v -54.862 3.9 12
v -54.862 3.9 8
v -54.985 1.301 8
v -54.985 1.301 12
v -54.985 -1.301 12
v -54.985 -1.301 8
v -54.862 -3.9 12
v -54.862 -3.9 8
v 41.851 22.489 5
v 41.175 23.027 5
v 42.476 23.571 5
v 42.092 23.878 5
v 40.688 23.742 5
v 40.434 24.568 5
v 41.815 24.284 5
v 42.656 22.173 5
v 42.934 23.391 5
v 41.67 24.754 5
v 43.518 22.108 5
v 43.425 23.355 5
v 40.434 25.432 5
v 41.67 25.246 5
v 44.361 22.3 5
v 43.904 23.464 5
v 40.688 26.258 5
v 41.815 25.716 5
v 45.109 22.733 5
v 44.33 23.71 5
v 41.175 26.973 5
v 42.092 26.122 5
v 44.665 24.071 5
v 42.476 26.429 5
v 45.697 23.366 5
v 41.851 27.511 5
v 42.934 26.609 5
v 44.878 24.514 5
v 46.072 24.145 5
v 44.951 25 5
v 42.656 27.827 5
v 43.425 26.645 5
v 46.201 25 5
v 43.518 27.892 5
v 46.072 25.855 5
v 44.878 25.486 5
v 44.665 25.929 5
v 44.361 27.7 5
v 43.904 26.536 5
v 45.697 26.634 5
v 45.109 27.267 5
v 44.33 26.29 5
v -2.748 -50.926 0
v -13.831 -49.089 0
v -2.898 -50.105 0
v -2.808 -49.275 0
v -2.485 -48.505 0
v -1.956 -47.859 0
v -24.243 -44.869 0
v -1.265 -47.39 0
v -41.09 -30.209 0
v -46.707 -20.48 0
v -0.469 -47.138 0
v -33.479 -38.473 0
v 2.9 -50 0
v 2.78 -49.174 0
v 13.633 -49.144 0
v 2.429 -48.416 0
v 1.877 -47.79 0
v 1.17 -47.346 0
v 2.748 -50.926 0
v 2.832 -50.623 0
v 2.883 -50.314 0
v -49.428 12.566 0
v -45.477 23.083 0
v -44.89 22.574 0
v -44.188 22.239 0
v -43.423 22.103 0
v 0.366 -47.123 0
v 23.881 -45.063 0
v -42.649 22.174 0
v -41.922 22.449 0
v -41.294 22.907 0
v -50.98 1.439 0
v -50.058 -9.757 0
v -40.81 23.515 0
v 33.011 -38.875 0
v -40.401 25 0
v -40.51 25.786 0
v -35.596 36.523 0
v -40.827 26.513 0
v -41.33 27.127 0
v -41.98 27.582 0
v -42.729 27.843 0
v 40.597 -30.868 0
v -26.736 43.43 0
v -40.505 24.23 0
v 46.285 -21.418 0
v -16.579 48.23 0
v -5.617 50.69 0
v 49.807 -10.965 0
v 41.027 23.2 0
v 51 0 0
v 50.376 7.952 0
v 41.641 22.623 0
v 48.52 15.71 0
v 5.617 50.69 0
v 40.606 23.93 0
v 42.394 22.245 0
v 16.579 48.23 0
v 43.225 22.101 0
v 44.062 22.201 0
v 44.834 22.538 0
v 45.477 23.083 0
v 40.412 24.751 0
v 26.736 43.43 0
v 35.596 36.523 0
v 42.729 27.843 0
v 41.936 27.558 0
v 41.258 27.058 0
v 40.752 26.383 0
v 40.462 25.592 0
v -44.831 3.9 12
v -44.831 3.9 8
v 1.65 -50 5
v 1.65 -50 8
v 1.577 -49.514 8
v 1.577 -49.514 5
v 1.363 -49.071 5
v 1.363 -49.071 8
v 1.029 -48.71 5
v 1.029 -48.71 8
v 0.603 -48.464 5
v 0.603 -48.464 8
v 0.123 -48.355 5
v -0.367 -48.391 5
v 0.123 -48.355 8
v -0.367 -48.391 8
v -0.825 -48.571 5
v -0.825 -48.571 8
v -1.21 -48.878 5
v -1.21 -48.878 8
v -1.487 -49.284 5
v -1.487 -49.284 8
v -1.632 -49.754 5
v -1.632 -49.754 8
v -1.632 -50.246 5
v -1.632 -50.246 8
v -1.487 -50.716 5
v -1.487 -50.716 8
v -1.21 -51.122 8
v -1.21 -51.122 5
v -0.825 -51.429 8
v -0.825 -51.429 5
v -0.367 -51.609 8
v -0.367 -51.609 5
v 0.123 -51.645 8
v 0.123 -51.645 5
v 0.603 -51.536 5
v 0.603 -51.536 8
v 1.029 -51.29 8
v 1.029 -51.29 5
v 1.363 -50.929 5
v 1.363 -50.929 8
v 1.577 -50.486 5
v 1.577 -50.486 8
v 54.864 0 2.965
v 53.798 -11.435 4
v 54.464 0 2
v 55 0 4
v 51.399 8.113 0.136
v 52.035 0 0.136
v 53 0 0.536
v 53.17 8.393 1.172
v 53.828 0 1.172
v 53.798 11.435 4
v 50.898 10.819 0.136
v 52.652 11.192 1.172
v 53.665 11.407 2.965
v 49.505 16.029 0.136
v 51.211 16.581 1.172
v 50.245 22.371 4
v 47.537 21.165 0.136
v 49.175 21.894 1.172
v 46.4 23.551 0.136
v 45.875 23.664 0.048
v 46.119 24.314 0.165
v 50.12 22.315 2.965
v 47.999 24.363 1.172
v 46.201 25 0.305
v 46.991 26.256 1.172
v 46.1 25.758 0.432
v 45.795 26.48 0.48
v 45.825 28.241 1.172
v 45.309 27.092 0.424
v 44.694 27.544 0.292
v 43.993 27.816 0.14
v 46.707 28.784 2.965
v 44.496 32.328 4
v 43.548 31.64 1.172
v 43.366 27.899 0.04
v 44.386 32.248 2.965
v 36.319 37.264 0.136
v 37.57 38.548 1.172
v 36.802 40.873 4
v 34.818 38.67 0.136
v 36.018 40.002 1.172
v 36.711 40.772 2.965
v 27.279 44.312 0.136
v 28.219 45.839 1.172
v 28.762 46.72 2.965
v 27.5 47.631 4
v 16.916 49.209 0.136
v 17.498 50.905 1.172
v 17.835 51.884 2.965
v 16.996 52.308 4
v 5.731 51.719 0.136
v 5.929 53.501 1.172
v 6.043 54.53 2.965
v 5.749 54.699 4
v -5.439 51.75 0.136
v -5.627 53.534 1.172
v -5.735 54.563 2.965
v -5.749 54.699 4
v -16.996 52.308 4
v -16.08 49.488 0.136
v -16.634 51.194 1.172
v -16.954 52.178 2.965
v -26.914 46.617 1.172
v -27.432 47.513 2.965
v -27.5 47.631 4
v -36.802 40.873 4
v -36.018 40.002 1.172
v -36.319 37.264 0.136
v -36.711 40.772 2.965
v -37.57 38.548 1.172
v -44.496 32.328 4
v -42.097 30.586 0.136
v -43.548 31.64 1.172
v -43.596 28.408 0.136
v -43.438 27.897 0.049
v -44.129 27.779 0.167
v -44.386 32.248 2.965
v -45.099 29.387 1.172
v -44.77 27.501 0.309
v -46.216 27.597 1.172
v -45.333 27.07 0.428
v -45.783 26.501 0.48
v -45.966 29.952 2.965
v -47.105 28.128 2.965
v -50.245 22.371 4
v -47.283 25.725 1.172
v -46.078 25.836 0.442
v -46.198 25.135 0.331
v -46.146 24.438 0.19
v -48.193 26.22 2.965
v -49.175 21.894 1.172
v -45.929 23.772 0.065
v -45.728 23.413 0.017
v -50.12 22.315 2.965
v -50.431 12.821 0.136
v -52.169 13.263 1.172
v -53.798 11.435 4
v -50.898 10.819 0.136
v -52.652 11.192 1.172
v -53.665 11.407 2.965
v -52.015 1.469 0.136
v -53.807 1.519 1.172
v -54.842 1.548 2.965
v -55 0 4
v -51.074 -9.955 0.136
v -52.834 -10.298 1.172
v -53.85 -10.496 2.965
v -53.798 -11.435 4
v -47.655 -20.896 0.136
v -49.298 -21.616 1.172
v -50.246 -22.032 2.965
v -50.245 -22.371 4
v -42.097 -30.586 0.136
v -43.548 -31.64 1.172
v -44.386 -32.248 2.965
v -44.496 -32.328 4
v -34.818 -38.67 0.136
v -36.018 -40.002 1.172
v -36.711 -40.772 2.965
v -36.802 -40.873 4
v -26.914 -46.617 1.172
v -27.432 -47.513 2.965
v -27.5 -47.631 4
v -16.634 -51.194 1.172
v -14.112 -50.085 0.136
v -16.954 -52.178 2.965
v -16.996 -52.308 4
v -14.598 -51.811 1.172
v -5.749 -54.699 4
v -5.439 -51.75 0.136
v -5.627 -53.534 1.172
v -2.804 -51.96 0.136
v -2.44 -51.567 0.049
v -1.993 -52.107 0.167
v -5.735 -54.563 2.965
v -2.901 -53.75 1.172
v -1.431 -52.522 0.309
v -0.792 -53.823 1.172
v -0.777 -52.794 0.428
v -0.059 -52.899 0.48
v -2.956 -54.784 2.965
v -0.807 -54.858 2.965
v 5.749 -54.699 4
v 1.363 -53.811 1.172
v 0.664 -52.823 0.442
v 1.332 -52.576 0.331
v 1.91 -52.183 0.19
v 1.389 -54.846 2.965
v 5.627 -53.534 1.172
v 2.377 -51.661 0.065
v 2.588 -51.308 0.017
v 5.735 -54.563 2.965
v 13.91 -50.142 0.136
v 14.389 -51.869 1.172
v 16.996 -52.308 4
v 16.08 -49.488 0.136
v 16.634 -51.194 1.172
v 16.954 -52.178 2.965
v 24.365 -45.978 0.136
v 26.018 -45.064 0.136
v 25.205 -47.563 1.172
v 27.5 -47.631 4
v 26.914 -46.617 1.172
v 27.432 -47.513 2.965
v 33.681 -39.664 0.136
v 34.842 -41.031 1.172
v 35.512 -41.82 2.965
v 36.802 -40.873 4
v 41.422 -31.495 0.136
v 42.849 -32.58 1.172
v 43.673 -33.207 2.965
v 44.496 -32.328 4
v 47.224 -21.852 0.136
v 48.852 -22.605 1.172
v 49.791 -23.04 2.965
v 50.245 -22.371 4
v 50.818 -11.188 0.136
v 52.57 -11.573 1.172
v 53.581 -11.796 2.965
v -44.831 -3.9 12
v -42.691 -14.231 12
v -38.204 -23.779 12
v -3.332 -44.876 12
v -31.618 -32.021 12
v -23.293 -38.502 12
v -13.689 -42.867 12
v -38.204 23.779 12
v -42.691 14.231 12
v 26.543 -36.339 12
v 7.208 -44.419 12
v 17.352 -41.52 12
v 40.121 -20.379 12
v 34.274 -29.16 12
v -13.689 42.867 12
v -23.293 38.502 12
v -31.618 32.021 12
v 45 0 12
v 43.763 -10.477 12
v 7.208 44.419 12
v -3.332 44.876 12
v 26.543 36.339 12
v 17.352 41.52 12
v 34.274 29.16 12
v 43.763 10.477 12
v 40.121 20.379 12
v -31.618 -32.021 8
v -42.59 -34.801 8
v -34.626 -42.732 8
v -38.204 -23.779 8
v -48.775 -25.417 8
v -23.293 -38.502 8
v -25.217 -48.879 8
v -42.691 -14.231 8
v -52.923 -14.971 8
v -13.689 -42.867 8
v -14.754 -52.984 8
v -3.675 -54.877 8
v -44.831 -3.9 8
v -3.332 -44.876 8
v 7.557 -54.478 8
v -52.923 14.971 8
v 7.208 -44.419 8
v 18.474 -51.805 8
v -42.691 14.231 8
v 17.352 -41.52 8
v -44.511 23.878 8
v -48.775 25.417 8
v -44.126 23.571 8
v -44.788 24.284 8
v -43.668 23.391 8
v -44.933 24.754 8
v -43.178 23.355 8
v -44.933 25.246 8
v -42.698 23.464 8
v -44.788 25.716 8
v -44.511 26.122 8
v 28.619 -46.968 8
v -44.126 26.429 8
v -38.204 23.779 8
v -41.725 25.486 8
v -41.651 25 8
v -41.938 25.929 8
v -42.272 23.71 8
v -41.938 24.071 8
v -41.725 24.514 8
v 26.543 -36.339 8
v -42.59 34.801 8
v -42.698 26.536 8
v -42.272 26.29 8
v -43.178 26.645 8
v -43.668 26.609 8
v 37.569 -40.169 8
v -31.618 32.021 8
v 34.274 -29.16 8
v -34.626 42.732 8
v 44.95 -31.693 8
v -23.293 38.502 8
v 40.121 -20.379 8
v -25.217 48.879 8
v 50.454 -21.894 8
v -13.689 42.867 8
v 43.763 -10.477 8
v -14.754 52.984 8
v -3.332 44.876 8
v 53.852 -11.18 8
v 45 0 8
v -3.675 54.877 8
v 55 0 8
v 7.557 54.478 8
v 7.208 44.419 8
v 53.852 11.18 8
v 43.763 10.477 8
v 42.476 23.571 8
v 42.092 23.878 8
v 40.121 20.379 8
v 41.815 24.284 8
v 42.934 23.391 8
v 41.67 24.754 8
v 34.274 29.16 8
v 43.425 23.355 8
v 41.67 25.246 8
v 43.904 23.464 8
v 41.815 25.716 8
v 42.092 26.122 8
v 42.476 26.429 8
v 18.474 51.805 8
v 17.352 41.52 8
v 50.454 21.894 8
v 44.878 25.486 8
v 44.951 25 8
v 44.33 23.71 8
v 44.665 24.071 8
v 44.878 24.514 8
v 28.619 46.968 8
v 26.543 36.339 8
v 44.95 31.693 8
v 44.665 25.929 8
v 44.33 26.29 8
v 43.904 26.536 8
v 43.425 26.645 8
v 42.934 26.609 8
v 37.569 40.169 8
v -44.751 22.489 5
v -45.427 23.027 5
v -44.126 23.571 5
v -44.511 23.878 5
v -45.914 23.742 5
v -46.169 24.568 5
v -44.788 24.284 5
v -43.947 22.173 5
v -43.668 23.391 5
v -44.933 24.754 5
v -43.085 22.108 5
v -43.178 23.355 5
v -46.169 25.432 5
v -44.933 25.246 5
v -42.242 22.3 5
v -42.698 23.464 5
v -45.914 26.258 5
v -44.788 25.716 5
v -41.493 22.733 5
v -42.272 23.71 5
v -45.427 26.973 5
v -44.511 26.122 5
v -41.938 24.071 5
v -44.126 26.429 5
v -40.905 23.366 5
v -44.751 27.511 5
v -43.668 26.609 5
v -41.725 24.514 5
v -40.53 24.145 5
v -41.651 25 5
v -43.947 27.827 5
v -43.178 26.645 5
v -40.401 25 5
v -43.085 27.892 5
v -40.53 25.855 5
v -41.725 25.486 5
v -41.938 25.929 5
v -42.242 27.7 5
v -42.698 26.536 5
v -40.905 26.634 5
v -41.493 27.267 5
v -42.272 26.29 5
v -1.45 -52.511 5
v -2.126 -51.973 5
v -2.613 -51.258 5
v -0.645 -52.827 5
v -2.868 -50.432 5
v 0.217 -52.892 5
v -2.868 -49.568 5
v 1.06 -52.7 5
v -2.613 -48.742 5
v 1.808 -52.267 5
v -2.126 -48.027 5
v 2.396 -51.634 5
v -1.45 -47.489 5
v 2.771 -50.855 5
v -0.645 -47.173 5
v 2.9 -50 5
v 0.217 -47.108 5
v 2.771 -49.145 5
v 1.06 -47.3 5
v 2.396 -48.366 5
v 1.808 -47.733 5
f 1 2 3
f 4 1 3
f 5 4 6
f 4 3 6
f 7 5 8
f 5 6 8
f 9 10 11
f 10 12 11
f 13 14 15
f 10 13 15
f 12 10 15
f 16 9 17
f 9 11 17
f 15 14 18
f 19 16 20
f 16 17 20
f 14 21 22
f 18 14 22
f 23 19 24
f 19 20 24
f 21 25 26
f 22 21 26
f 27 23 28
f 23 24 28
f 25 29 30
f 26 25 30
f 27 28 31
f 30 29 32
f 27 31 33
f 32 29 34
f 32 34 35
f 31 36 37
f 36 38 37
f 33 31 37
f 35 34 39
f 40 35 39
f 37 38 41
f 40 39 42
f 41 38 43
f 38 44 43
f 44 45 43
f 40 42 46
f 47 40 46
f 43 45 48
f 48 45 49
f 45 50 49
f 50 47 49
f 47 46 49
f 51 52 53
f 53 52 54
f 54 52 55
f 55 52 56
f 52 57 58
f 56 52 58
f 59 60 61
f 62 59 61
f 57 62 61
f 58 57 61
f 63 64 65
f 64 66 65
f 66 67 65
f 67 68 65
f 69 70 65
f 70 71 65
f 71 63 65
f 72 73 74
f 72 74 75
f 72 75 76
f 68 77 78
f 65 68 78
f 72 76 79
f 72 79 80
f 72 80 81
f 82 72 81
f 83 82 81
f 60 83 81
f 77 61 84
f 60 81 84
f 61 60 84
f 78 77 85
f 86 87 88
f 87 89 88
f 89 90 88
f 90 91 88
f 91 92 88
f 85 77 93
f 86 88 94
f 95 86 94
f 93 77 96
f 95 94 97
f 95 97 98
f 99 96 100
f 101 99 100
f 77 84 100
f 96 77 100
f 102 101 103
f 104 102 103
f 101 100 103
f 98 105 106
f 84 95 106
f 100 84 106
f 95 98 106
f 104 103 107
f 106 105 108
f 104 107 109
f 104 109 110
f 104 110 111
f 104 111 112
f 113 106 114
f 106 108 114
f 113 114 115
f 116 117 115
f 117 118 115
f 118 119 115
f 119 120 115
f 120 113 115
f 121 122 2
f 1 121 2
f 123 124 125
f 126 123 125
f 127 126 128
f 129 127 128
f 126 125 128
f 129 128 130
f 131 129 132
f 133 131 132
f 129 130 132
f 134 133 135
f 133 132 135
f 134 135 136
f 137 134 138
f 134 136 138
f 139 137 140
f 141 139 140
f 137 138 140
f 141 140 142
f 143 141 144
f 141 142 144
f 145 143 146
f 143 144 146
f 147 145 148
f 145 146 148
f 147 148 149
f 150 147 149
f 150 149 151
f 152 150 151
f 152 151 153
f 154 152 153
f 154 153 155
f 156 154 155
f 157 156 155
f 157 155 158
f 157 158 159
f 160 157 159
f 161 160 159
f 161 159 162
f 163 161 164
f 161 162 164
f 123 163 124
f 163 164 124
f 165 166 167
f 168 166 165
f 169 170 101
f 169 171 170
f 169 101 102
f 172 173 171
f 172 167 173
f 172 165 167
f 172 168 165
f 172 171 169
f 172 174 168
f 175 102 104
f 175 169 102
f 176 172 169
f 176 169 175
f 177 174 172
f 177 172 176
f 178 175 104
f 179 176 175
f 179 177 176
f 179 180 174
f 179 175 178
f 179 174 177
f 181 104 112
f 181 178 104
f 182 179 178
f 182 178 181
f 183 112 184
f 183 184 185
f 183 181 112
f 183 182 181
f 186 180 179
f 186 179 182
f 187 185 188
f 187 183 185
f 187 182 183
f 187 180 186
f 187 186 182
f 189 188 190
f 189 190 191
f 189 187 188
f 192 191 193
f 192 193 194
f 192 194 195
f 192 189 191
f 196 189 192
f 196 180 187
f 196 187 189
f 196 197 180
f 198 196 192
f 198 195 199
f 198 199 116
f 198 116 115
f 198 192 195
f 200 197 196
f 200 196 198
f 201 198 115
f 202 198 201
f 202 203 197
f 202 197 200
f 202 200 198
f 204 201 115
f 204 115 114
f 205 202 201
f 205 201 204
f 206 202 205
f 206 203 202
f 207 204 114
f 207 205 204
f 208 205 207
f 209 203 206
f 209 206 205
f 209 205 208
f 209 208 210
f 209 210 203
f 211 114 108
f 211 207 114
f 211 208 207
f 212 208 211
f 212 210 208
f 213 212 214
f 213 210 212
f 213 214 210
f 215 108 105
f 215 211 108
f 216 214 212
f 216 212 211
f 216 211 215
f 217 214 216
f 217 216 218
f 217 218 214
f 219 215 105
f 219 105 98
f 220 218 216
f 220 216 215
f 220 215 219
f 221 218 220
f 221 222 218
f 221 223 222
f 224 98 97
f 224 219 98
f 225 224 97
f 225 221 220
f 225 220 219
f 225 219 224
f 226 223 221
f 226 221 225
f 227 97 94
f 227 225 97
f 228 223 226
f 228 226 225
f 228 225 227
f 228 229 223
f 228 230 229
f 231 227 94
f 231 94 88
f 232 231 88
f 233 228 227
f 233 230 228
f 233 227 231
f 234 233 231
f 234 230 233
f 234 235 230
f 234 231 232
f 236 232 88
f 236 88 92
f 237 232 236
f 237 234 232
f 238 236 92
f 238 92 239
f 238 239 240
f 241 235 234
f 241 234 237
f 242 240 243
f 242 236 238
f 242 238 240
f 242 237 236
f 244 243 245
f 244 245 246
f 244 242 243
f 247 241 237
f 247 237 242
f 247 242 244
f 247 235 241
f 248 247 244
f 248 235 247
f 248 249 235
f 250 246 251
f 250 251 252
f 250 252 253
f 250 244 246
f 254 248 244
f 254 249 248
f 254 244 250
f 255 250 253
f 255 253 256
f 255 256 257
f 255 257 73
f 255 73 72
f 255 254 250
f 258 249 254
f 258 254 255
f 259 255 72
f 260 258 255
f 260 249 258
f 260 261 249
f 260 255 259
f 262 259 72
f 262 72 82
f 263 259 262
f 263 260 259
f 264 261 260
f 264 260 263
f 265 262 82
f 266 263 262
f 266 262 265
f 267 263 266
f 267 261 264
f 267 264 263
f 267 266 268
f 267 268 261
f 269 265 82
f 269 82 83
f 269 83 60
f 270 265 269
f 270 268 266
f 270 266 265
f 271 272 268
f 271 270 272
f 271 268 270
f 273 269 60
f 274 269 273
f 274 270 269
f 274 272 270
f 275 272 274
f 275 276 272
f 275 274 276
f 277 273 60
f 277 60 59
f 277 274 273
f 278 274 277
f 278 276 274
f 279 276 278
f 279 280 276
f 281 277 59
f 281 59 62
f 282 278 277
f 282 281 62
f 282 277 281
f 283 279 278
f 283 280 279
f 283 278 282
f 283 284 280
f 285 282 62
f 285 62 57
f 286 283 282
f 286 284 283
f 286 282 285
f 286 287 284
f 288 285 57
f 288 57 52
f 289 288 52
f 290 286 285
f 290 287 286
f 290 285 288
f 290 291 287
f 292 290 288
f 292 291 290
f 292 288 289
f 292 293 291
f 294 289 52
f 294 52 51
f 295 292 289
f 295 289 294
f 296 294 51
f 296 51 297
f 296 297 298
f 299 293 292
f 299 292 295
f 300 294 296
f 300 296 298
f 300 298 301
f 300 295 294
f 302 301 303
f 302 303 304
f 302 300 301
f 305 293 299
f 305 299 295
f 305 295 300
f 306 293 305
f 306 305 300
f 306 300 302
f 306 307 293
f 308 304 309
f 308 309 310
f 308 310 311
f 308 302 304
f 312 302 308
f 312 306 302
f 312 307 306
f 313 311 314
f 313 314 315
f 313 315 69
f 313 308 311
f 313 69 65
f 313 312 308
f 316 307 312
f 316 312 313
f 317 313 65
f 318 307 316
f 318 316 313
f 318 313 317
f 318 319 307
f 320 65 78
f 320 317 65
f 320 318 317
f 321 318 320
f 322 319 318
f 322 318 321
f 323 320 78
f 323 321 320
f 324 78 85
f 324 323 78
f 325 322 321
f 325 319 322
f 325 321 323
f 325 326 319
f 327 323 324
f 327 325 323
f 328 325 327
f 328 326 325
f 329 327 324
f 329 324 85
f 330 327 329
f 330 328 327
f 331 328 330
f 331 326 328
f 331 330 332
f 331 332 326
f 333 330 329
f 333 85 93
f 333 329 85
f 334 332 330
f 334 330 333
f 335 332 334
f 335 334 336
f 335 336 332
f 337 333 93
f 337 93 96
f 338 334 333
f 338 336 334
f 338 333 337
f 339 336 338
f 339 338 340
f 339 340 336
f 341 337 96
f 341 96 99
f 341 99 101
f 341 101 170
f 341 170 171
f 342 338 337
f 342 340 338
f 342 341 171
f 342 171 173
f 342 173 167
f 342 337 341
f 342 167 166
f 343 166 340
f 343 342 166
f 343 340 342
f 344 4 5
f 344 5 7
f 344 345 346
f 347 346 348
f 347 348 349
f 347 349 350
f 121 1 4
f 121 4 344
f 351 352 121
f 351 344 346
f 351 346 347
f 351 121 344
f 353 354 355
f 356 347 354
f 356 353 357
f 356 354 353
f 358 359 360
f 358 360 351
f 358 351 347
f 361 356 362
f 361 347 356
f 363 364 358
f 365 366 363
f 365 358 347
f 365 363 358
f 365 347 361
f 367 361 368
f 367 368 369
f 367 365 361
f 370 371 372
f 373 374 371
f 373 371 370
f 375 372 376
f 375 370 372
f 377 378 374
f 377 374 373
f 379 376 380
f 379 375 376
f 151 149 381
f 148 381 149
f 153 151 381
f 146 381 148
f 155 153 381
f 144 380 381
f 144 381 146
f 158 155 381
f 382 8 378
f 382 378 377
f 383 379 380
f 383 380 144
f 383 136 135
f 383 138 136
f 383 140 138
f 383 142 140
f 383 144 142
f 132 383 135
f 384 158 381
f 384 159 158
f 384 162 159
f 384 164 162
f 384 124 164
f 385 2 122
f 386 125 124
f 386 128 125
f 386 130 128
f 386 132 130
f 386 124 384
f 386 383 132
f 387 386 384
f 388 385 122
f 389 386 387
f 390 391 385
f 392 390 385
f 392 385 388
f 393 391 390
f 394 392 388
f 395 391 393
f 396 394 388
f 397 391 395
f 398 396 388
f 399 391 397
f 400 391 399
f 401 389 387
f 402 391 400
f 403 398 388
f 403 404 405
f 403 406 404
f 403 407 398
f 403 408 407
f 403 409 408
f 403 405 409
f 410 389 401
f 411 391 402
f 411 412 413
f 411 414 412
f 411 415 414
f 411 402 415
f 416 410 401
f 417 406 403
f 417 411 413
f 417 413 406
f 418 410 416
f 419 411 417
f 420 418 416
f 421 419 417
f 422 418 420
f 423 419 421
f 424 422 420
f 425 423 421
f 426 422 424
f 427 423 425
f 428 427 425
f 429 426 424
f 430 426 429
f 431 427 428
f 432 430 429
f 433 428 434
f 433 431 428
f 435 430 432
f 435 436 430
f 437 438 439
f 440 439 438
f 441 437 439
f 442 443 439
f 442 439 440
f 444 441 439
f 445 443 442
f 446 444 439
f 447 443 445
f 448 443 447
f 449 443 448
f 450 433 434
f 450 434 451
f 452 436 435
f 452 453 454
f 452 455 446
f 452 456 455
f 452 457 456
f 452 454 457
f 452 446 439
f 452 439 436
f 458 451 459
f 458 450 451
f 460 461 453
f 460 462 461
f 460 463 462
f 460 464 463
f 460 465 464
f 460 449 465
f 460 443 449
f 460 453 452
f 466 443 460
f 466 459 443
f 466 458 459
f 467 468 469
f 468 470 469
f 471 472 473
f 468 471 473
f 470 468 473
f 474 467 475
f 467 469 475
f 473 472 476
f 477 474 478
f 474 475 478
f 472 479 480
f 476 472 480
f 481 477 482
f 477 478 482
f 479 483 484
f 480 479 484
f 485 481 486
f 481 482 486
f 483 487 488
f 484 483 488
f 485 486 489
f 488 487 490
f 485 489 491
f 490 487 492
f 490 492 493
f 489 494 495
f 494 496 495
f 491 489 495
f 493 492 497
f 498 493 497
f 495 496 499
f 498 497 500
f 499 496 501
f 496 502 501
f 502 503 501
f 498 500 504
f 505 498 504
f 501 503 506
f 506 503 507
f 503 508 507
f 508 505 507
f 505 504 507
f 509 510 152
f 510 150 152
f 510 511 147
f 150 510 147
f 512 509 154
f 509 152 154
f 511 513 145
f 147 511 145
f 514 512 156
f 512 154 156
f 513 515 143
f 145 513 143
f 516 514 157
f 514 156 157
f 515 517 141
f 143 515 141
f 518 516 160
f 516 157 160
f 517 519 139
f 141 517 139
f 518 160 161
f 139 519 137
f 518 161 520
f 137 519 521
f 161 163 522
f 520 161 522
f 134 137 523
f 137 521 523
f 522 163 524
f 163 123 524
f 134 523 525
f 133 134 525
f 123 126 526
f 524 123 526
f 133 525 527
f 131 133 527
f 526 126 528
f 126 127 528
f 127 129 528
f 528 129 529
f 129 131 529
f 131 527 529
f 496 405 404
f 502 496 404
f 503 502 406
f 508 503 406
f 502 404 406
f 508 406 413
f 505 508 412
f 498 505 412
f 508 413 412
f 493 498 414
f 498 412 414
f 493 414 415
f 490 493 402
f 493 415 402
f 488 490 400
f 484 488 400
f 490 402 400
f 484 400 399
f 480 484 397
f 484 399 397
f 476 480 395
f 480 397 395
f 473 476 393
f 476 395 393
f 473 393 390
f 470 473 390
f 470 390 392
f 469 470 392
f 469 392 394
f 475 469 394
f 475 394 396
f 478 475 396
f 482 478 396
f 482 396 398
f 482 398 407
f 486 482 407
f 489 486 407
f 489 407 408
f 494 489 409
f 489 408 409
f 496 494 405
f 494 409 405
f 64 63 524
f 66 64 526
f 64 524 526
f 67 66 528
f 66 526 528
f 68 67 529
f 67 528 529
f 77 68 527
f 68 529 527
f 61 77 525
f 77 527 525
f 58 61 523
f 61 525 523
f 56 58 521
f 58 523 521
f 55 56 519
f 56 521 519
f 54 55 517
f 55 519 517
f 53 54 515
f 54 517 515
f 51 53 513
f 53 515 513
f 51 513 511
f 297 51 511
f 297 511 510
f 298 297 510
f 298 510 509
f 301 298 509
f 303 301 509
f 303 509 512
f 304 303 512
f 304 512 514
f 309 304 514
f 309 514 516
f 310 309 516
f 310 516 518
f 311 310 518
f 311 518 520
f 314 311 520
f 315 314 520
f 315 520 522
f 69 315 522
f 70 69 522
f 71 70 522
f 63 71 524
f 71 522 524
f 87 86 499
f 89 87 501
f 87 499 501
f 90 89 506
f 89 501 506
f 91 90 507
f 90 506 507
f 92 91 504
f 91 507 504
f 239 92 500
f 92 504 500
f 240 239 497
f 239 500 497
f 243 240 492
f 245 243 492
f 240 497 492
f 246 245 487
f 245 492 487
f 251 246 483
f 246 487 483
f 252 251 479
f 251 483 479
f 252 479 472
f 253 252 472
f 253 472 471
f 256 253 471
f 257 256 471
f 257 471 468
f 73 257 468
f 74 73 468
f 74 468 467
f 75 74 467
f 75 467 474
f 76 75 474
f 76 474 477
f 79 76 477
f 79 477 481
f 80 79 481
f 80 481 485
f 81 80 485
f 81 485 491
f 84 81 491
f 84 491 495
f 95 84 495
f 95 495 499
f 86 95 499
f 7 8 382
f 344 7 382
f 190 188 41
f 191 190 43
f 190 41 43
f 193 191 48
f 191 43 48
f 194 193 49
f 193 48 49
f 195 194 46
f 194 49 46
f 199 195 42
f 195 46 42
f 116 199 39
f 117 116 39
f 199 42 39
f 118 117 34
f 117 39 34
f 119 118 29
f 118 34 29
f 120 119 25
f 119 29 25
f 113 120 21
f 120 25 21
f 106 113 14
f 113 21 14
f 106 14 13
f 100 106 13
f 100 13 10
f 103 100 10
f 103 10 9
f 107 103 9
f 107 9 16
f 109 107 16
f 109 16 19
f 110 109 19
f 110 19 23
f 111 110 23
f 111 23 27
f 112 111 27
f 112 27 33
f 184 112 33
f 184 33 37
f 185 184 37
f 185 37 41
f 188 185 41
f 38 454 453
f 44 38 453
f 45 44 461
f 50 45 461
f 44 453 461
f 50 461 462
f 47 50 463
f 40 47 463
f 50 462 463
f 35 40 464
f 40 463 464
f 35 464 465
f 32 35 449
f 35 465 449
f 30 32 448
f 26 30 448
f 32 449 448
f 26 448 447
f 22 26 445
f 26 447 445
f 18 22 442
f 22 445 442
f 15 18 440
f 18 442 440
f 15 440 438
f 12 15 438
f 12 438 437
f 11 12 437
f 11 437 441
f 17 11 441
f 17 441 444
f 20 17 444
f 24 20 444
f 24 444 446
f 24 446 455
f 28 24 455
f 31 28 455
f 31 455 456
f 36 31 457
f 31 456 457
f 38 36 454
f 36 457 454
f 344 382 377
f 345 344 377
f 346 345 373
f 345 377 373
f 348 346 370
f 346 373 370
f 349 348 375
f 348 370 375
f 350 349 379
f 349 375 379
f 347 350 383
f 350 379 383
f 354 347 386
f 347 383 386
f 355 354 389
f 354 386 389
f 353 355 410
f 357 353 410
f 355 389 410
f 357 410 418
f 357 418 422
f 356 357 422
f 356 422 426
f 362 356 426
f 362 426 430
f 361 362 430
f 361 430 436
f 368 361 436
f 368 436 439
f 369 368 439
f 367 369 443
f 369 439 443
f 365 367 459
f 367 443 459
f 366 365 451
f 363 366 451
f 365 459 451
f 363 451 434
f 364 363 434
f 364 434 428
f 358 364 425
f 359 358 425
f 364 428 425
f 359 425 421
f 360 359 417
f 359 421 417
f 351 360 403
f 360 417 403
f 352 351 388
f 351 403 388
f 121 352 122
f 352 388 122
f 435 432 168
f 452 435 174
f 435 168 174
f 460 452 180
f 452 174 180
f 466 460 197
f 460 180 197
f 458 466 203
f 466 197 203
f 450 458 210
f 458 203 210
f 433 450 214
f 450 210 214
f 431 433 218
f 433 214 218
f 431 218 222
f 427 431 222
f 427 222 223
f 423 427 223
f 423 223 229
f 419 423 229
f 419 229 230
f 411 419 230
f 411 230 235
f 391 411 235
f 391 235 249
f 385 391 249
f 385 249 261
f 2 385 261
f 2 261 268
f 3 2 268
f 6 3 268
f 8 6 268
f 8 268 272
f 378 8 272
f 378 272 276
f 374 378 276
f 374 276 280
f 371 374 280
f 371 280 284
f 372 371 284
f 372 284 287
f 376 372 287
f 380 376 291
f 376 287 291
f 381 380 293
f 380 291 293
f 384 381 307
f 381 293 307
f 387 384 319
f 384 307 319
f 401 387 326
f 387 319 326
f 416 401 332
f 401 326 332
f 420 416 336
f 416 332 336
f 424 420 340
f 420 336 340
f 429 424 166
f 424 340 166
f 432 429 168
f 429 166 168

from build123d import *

# Parameters (mm, degrees)
ESBO_O1_R                = 55
RESSALTO_EXTRUS_O1_DEPTH = 8
RESSALTO_EXTRUS_O2_DEPTH = 4
ESBO_O3_R                = 1.65
CORTE_EXTRUS_O1_DEPTH    = 3
ESBO_O4_R                = 2.9
CORTE_EXTRUS_O2_DEPTH    = 5
FILETE1_R                = 4


with BuildPart() as part:
    # Esboço1 → Ressalto-extrusão1 (new body)
    with BuildSketch(Plane.XY):
        Circle(ESBO_O1_R)
    extrude(amount=RESSALTO_EXTRUS_O1_DEPTH)

    # Esboço2 → Ressalto-extrusão2 (add)
    with BuildSketch(Plane.XY.offset(8)):
        with BuildLine():
            Line((-44.830681458, 3.9), (-54.861553022, 3.9))
            ThreePointArc((-54.861553022, 3.9), (-55, 0), (-54.861553022, -3.9))
            Line((-54.861553022, -3.9), (-44.830681458, -3.9))
            ThreePointArc((-44.830681458, -3.9), (45, 0), (-44.830681458, 3.9))
        make_face()
    extrude(amount=RESSALTO_EXTRUS_O2_DEPTH)

    # Esboço3 → Corte-extrusão1 (cut)
    with BuildSketch(Plane.XY.offset(8)):
        with Locations((2.2845e-05, -50)):
            Circle(ESBO_O3_R)
        with Locations((-43.301247344, 25)):
            Circle(ESBO_O3_R)
        with Locations((43.301293034, 25)):
            Circle(ESBO_O3_R)
    extrude(amount=-CORTE_EXTRUS_O1_DEPTH, mode=Mode.SUBTRACT)

    # Esboço4 → Corte-extrusão2 (cut)
    with BuildSketch(Plane.XY.offset(5)):
        with Locations((-43.301247344, 25)):
            Circle(ESBO_O4_R)
        with Locations((43.301293034, 25)):
            Circle(ESBO_O4_R)
        with Locations((2.2845e-05, -50)):
            Circle(ESBO_O4_R)
    extrude(amount=-CORTE_EXTRUS_O2_DEPTH, mode=Mode.SUBTRACT)

    # Filete1
    # the kernel refuses this fillet: 4 mm, written as the material it takes off along each edge
    with BuildSketch(Plane(origin=(0, 0, 0), x_dir=(1, 0, 0), z_dir=(0, -1, 0))) as filete1_piece_1:
        with BuildLine():
            CenterArc((55 - FILETE1_R, FILETE1_R), FILETE1_R, 270, 90)
            Line((55 - FILETE1_R, 0), (55, 0))
            Line((55, 0), (55, FILETE1_R))
        make_face()
    revolve(axis=Axis((0, 0, 0), (0, 0, 1)), mode=Mode.SUBTRACT)


solid = part.part
